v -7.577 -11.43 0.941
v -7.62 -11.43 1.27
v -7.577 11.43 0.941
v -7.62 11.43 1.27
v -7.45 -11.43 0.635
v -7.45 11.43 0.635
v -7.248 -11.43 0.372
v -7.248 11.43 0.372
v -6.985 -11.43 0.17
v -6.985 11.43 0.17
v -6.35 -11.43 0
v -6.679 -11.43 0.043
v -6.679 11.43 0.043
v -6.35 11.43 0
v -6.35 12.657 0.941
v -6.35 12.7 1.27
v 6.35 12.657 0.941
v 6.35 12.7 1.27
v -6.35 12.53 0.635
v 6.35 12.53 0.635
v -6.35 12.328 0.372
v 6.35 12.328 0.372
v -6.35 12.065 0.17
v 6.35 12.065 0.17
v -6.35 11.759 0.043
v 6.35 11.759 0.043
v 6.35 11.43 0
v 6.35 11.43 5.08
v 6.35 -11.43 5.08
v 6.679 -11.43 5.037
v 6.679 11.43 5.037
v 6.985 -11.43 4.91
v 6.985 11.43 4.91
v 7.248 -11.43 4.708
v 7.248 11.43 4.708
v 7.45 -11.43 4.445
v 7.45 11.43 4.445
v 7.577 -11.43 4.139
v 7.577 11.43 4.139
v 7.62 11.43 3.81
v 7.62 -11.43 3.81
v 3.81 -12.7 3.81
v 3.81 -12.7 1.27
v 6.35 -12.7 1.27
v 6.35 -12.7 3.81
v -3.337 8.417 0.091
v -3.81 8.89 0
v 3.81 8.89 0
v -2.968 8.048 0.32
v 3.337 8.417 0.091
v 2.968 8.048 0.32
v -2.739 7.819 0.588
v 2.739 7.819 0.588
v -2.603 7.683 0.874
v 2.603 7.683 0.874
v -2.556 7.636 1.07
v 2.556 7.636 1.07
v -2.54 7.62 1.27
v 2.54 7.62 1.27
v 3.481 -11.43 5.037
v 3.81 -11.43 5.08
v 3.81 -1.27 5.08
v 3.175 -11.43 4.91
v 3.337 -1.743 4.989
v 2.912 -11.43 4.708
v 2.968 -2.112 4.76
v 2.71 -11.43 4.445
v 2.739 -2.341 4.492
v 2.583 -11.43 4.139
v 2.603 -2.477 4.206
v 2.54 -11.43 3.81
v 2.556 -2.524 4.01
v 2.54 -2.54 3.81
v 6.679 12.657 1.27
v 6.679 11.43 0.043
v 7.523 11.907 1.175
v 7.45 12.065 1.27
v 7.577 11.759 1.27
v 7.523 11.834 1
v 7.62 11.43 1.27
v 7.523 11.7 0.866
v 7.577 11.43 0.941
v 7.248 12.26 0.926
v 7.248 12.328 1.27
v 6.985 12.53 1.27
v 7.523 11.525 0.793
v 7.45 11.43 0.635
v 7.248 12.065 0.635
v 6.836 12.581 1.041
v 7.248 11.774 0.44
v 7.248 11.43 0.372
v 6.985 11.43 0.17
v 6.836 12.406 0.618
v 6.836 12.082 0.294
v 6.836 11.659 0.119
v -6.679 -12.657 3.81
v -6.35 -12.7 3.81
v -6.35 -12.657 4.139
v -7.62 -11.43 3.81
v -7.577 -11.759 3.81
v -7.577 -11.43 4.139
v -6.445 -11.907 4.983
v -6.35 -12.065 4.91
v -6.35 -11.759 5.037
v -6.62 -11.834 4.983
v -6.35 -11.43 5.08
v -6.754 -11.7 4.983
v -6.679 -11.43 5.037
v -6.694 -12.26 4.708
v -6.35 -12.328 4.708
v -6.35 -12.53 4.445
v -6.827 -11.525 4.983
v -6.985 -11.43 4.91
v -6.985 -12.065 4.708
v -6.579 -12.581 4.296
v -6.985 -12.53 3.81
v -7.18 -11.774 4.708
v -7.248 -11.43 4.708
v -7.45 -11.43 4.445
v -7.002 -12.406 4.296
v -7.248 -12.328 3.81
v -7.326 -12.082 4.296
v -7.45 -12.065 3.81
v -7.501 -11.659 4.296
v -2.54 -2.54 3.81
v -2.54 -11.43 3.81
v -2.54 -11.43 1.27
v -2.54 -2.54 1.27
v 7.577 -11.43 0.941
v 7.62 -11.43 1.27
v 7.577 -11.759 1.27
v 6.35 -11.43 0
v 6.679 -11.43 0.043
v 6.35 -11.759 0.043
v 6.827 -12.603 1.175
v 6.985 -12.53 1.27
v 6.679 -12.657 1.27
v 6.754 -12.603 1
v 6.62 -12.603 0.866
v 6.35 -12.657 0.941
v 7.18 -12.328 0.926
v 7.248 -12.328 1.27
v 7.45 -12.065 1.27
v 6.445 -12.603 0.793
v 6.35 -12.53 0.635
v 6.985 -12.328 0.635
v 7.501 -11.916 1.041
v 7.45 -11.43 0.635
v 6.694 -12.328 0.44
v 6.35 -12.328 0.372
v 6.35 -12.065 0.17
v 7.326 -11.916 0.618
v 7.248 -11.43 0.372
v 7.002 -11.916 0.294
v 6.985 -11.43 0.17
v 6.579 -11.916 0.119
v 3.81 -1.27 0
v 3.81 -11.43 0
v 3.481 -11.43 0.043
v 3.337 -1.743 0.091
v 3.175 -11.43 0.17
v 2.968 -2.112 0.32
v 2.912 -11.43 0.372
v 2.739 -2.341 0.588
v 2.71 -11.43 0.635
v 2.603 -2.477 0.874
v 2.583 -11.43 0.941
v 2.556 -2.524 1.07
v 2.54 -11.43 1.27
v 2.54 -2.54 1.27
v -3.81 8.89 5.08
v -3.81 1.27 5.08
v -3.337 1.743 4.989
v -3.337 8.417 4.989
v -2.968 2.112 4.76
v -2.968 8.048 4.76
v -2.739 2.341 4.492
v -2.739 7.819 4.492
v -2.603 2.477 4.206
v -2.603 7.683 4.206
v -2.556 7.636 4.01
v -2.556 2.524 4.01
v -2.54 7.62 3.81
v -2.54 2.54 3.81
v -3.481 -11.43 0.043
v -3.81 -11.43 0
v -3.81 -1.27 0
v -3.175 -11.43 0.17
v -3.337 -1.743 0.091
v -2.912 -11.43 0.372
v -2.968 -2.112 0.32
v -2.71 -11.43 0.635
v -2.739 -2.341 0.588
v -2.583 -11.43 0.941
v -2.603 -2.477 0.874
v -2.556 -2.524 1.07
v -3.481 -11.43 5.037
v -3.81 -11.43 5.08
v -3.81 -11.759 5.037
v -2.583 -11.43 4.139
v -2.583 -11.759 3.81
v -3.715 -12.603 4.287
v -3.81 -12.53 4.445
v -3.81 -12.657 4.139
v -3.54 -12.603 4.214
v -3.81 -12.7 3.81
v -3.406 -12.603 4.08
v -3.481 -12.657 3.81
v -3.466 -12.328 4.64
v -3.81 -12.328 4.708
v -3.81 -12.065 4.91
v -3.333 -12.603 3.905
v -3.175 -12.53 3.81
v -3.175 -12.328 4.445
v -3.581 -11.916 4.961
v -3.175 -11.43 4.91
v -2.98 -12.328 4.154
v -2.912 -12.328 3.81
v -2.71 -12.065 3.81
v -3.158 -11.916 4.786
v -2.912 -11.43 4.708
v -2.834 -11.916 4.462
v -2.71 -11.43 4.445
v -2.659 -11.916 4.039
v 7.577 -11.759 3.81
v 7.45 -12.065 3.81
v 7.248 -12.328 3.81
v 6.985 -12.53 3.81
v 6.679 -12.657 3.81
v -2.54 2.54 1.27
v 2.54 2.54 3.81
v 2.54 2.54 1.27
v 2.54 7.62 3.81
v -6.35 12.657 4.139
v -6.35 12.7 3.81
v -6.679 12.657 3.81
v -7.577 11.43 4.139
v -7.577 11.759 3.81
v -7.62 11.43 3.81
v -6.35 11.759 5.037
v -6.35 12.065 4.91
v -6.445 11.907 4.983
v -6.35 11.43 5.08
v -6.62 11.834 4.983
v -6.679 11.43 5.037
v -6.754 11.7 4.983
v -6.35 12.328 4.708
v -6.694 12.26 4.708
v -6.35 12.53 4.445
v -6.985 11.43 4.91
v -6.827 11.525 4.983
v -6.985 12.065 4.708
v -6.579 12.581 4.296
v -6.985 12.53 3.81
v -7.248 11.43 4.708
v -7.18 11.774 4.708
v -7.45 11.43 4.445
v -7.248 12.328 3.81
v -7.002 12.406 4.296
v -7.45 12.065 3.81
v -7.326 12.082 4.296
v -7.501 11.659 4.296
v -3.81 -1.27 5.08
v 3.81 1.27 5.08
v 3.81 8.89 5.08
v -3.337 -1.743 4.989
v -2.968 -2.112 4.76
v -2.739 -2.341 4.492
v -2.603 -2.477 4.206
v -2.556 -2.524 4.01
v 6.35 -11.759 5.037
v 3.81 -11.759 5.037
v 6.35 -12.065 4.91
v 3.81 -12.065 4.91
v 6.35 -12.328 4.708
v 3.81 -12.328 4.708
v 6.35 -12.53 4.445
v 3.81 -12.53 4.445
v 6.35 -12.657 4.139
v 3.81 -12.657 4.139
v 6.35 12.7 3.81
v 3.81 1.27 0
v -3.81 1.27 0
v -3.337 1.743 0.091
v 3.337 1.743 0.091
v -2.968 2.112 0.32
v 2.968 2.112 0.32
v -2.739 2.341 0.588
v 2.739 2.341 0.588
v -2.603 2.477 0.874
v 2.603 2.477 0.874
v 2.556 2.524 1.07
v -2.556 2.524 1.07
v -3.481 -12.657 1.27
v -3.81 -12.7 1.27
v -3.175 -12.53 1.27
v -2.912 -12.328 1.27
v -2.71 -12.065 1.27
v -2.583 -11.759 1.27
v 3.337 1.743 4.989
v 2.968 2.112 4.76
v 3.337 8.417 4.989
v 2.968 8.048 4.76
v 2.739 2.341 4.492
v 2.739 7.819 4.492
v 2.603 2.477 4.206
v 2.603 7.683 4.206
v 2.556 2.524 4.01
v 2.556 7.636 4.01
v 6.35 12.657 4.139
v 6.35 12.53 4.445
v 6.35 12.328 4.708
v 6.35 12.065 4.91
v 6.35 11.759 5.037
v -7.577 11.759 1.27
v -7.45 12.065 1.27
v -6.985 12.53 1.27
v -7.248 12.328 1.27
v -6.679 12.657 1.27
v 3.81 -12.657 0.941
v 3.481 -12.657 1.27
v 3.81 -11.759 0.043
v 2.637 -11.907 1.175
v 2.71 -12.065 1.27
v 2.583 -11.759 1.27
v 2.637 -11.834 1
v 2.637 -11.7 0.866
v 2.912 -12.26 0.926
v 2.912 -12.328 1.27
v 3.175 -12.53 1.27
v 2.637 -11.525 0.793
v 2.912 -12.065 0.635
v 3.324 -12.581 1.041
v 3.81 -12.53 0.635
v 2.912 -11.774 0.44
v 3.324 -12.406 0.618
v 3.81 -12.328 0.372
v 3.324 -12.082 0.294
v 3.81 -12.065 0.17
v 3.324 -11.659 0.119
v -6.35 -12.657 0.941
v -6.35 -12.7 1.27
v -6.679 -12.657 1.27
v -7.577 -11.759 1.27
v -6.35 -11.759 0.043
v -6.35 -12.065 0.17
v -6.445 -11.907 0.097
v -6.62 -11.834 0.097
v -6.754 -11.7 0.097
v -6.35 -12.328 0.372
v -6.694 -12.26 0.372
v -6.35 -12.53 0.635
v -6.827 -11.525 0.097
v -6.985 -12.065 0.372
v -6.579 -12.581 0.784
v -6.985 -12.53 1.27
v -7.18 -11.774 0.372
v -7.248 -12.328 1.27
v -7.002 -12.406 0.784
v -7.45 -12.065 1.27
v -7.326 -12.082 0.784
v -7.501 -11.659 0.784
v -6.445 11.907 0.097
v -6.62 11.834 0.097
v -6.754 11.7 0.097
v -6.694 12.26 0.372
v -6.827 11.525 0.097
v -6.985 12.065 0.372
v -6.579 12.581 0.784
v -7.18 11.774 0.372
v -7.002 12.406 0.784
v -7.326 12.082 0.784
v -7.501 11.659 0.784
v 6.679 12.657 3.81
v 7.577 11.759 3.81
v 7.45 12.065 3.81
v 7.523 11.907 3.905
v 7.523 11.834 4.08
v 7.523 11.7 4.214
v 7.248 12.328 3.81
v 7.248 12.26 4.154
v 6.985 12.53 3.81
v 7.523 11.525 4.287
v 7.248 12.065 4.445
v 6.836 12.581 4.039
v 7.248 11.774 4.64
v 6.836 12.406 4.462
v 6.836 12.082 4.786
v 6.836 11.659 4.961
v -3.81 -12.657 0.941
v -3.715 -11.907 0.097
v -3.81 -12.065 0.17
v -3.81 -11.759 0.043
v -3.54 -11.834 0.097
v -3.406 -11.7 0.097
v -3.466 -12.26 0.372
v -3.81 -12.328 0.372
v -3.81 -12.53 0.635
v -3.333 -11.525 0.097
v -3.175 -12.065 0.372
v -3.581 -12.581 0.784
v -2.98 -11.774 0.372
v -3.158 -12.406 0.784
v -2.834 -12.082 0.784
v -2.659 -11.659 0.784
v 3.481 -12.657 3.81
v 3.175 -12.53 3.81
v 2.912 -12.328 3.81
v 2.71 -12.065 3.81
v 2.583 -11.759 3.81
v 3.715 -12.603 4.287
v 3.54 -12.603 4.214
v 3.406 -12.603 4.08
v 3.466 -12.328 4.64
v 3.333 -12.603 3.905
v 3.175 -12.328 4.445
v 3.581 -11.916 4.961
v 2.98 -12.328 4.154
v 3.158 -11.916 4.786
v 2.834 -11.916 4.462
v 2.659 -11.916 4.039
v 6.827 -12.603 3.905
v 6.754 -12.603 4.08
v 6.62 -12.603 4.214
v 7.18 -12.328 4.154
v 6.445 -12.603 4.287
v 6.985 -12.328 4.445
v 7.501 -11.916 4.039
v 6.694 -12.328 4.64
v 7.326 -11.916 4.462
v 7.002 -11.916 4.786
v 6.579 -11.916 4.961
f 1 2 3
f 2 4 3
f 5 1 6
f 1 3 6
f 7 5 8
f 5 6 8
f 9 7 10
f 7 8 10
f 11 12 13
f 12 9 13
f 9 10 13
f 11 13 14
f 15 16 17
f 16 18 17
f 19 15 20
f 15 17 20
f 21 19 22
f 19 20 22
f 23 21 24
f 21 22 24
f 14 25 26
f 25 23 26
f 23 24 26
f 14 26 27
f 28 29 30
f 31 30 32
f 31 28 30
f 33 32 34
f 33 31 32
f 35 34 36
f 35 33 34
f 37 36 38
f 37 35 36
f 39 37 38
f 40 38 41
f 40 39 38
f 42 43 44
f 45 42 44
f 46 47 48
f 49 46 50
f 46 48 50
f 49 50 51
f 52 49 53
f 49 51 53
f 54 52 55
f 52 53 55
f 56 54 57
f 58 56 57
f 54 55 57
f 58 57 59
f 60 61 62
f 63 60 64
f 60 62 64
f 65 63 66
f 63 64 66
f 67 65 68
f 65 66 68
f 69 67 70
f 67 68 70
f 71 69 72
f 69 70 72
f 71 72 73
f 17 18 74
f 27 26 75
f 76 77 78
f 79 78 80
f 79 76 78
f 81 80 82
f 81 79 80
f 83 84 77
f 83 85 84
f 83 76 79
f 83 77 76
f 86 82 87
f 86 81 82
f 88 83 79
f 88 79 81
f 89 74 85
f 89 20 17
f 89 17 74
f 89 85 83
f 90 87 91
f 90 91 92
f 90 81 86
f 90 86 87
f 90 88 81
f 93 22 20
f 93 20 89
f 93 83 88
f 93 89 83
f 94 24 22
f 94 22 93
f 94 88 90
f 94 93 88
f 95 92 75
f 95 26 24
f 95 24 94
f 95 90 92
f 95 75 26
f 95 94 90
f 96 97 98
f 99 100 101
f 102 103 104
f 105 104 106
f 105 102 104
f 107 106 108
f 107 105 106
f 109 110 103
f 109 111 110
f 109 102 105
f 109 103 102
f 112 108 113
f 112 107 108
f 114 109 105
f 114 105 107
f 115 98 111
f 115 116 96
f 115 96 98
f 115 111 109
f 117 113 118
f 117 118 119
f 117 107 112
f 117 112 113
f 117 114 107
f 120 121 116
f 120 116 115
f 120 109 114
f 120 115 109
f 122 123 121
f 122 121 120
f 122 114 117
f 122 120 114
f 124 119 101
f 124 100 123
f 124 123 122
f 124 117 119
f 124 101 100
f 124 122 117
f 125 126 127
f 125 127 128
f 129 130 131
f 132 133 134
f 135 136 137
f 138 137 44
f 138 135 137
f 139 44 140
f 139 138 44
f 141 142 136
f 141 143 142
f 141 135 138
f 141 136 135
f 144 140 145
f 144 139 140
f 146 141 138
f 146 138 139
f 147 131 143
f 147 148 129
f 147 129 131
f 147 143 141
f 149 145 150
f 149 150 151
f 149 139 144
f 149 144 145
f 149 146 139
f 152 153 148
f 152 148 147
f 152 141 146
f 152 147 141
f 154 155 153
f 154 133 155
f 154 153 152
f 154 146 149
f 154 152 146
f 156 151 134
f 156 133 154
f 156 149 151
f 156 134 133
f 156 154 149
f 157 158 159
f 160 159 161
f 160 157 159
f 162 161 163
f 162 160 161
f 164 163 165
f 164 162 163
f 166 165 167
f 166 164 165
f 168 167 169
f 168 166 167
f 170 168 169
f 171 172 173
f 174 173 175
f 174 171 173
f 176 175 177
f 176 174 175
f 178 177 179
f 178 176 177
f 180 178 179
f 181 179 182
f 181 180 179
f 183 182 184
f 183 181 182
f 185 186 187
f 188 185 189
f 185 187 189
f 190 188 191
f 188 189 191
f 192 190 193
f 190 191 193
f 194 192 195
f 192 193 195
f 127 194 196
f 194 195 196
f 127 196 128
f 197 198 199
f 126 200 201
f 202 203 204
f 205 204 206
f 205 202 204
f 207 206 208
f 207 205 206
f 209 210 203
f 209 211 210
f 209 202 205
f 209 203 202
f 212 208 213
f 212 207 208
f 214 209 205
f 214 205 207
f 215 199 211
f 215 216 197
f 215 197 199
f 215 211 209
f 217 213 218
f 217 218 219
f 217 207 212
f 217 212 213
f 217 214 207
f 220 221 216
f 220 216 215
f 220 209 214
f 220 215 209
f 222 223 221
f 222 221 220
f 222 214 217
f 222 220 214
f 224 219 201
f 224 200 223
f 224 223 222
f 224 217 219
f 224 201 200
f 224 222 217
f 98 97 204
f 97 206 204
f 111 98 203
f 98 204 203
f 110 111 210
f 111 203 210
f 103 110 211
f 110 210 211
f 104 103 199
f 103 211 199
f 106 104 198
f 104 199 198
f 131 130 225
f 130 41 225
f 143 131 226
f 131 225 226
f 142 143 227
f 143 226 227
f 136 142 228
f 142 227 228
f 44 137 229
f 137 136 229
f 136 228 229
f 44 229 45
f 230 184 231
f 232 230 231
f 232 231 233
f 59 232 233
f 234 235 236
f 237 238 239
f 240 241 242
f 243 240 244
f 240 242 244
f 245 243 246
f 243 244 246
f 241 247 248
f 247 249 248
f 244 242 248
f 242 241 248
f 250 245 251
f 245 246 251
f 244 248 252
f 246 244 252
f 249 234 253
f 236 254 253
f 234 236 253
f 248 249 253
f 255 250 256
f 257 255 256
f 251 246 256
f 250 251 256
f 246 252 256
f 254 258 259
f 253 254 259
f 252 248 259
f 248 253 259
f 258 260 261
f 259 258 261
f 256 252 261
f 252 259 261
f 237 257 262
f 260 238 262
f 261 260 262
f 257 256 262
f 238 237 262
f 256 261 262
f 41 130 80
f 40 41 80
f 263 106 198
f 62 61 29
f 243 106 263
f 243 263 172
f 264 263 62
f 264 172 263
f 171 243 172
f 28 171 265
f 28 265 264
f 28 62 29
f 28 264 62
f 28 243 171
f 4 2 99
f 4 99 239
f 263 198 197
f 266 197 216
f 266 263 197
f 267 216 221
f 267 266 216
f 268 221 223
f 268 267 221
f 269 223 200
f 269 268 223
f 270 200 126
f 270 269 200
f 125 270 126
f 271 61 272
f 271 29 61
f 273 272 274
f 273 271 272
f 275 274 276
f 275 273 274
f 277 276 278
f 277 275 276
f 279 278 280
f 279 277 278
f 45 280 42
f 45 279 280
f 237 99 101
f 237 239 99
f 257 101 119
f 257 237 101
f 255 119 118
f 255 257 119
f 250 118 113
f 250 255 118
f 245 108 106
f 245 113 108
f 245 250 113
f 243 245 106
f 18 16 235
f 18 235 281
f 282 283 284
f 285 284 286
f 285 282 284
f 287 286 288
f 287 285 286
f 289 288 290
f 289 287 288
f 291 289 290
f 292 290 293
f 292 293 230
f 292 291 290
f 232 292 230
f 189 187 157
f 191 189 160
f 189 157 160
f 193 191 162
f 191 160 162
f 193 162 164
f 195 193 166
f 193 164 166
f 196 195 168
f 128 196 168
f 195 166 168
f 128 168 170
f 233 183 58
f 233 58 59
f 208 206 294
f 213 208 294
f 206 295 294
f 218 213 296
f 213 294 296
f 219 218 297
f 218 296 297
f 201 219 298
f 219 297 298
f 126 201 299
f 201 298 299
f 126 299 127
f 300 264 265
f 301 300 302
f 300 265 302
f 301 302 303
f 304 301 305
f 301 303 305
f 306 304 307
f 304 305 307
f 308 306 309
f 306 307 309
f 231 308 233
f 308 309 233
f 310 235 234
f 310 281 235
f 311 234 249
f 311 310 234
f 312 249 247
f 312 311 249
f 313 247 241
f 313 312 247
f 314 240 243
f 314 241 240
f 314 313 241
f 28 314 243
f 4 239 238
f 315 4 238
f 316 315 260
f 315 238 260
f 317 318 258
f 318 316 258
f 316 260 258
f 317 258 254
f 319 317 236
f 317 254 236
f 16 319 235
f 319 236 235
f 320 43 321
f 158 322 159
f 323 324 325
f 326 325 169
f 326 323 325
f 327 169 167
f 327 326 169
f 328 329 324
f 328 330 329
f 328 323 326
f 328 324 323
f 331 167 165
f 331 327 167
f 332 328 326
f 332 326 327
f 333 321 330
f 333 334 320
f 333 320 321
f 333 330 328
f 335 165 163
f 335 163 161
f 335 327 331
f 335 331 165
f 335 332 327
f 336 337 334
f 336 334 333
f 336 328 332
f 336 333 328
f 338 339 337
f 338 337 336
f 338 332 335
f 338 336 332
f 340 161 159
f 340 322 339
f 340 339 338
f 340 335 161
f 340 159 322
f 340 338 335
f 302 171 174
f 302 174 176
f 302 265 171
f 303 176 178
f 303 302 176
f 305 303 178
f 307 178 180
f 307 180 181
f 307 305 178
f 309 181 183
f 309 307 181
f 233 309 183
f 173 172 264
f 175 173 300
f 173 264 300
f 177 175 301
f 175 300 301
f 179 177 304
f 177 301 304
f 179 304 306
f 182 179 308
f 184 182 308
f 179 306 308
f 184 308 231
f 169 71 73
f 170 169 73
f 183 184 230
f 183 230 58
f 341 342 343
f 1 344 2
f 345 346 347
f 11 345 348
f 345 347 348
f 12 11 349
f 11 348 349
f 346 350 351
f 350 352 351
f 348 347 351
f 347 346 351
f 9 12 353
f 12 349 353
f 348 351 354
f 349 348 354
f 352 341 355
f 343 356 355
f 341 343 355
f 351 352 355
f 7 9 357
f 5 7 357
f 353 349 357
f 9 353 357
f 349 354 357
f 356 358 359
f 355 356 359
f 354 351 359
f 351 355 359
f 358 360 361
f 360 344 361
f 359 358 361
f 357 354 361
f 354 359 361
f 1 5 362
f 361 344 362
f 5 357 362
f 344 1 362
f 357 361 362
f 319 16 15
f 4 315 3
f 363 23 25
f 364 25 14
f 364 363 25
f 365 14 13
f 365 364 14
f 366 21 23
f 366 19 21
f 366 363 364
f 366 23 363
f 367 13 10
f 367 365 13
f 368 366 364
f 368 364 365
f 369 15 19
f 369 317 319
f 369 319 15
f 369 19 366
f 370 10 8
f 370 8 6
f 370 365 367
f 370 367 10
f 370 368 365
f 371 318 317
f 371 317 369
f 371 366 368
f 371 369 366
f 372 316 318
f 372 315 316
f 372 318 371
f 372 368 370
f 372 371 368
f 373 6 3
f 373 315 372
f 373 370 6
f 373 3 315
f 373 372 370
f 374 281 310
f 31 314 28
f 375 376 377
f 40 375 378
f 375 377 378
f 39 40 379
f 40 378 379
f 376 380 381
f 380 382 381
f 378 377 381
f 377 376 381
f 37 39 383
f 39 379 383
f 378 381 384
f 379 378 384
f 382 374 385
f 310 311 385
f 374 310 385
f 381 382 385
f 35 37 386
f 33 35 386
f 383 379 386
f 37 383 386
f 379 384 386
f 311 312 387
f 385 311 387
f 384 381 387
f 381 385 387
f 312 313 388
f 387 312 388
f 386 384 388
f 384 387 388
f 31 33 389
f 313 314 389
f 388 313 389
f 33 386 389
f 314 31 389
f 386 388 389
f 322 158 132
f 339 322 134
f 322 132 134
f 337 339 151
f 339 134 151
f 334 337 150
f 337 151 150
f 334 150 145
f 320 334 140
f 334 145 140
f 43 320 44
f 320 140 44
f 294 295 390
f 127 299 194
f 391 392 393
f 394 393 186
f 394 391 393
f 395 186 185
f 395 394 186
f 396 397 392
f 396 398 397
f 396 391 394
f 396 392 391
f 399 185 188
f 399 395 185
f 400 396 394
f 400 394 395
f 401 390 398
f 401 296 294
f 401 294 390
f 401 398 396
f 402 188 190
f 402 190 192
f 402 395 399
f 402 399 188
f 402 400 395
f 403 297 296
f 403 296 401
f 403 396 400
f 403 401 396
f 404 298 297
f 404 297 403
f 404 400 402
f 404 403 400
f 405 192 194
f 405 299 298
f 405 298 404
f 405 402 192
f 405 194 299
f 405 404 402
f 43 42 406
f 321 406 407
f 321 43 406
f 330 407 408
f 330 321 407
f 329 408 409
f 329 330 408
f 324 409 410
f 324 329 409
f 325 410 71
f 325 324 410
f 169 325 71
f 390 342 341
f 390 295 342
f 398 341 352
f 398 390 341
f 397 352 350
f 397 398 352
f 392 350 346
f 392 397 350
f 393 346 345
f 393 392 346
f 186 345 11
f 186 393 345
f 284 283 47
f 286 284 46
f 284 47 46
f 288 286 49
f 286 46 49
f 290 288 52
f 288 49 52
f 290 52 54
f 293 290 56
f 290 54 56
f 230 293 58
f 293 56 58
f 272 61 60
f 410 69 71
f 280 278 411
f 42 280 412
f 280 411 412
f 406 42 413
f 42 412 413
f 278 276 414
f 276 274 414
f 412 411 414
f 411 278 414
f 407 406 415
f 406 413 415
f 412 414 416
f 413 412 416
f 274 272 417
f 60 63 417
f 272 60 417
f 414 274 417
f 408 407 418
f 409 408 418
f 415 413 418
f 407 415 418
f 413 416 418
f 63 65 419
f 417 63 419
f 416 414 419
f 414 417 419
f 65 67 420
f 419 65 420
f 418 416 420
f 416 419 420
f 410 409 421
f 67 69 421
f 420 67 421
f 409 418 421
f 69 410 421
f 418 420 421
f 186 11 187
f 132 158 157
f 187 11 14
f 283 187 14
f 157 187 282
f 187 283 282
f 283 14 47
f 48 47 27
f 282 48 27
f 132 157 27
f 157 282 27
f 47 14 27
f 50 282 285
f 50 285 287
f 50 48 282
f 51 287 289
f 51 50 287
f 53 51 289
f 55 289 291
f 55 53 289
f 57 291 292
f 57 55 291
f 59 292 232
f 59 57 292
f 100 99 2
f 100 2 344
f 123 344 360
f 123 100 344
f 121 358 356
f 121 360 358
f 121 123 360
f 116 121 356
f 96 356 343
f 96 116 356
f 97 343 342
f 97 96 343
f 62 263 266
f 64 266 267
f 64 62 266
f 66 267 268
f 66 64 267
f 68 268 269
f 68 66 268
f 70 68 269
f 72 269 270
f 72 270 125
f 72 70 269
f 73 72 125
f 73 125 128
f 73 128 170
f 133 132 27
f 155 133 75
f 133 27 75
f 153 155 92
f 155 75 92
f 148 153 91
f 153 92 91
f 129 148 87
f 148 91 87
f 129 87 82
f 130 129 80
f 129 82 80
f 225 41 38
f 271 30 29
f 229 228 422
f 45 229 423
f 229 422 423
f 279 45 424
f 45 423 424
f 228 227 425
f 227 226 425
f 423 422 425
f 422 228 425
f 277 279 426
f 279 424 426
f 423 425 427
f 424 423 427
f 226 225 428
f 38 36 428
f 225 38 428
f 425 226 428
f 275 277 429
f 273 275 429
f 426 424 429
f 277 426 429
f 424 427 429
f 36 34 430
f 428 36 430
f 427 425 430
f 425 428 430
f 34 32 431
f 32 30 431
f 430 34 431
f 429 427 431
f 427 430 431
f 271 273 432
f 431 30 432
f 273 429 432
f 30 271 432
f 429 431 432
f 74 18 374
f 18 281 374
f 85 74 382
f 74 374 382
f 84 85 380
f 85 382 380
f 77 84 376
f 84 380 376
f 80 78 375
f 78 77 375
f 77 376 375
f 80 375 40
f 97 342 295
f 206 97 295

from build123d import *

# Parameters (mm, degrees)
F0_W     = 15.24
F0_H     = 25.4
F1_DEPTH = 5.08
F2_W     = 5.08
F2_H     = 5.08
F2_H_2   = 10.16
F3_DEPTH = 5.08
F4_R     = 1.27


with BuildPart() as f1:
    # F0 (on Top) → F1 (new body)
    with BuildSketch(Plane.XY):
        Rectangle(F0_W, F0_H)
    extrude(amount=F1_DEPTH)

    # F2 (on face) → F3 (cut)
    with BuildSketch(Plane.XY.offset(5.08)):
        with Locations((0, 5.08)):
            Rectangle(F2_W, F2_H)
        with Locations((0, -7.62)):
            Rectangle(F2_W, F2_H_2)
    extrude(amount=-F3_DEPTH, mode=Mode.SUBTRACT)

    # F4
    f4_edges = [f1.edges().sort_by_distance(p)[0] for p in [
        (-7.62, 12.7, 2.54),
        (-7.62, -12.7, 2.54),
        (0, 2.54, 5.08),
        (2.54, 5.08, 5.08),
        (-2.54, 5.08, 5.08),
        (0, 7.62, 5.08),
        (0, 12.7, 5.08),
        (0, 12.7, 0),
        (7.62, 12.7, 2.54),
        (0, -2.54, 5.08),
        (0, -2.54, 0),
        (2.54, -7.62, 5.08),
        (-2.54, -7.62, 5.08),
        (7.62, 0, 0),
        (7.62, 0, 5.08),
        (7.62, -12.7, 2.54),
        (5.08, -12.7, 5.08),
        (5.08, -12.7, 0),
        (2.54, -12.7, 2.54),
        (-5.08, -12.7, 5.08),
        (-2.54, -12.7, 2.54),
        (-7.62, 0, 5.08),
        (-5.08, -12.7, 0),
        (0, 2.54, 0),
        (-2.54, 5.08, 0),
        (0, 7.62, 0),
        (2.54, 5.08, 0),
        (-7.62, 0, 0),
        (-2.54, -7.62, 0),
        (2.54, -7.62, 0),
    ]]
    fillet(f4_edges, radius=F4_R)


solid = f1.part
